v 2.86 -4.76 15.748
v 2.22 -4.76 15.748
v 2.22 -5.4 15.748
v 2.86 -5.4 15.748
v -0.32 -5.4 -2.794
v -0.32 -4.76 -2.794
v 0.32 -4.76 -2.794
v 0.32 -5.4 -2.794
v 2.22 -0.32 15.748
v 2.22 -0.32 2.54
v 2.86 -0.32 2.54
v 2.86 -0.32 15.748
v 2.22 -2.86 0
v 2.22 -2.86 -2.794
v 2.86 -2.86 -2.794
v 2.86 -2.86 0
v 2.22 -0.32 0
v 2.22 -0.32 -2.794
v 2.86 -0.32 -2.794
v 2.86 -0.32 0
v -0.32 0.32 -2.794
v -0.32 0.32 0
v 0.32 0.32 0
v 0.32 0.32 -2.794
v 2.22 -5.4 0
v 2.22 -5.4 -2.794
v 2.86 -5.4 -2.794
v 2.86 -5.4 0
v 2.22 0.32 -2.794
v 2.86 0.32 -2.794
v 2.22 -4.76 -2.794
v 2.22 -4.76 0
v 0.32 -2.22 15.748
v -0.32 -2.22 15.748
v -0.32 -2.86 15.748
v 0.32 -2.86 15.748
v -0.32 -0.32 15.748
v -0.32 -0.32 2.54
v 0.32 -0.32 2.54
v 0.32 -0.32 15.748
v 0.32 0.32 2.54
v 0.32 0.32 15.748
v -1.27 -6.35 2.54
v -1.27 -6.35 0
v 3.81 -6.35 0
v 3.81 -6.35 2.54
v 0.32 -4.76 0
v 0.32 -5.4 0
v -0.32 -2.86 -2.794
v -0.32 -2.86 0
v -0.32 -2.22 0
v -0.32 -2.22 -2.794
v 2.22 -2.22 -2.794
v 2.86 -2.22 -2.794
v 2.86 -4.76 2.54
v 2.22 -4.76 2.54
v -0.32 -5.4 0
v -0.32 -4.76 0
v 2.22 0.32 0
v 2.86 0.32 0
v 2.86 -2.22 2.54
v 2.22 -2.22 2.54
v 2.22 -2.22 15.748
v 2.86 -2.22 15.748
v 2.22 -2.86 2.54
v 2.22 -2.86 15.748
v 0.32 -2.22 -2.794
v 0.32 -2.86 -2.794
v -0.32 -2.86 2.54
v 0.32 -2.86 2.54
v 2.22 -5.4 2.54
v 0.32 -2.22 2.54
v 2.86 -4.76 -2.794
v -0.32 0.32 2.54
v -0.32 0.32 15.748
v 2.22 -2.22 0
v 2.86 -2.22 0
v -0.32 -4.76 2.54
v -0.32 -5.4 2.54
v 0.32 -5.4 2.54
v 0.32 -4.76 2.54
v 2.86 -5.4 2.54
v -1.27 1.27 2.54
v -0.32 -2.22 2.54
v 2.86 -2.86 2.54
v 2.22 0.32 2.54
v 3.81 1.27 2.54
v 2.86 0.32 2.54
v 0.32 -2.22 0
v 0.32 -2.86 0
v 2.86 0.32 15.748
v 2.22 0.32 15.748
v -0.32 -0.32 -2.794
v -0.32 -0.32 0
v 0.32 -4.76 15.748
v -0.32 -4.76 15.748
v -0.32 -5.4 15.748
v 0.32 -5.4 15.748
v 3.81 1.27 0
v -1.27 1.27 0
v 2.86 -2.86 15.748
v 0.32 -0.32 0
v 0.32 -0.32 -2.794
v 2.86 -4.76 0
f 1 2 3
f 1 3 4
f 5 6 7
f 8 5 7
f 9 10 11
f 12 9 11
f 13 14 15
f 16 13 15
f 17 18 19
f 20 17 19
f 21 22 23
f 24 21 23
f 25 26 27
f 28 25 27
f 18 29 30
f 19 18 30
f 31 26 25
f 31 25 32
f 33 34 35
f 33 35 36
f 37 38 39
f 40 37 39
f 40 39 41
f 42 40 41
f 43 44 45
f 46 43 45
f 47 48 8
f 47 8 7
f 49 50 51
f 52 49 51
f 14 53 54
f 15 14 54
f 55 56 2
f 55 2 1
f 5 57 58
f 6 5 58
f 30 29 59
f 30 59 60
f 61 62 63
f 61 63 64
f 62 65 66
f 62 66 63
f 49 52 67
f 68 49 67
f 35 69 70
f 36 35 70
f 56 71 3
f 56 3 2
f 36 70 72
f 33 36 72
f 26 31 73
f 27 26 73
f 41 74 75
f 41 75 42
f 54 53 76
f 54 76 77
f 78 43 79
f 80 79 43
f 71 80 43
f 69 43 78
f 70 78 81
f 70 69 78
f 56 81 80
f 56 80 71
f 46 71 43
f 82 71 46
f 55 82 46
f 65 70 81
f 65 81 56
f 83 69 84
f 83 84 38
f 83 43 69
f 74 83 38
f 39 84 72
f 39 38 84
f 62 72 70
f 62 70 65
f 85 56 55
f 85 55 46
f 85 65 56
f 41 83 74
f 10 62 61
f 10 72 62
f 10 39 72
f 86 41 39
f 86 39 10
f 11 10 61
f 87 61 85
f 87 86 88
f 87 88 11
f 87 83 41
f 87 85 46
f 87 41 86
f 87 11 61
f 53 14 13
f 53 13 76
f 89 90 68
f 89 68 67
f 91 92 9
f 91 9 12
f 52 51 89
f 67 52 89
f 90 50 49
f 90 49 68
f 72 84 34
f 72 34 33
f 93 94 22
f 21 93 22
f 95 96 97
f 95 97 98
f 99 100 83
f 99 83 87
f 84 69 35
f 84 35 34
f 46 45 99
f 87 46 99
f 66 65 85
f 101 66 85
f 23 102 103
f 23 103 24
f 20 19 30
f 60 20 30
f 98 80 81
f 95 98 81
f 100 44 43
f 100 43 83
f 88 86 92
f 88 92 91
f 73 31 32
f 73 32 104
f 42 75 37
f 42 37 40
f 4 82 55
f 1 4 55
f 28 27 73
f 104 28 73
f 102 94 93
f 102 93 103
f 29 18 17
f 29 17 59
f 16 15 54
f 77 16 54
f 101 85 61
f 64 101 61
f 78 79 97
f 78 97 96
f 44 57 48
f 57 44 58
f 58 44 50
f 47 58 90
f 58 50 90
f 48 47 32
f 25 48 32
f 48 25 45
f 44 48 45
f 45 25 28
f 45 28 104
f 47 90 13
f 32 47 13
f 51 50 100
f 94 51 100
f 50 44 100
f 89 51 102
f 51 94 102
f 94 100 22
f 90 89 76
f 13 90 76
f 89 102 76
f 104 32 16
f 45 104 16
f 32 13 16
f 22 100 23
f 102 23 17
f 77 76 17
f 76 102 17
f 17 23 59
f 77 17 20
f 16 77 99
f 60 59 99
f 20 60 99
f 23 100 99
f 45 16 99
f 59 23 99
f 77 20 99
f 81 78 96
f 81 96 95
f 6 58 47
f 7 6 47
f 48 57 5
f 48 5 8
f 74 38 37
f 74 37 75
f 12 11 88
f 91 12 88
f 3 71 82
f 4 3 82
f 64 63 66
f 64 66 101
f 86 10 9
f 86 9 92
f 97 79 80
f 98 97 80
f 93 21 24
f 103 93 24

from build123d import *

# Parameters (mm, degrees)
SKETCH_W                          = 5.08
SKETCH_H                          = 7.62
PAD_DEPTH                         = 2.54
SKETCH001_W                       = 0.64
SKETCH001_H                       = 0.64
PAD001_DEPTH                      = 13.208
PAD001_DEPTH_BACK                 = 5.334
SKETCH001_LINEARPATTERN_2_W       = 0.64
SKETCH001_LINEARPATTERN_2_H       = 0.64
PAD001_LINEARPATTERN_2_DEPTH      = 13.208
PAD001_LINEARPATTERN_2_DEPTH_BACK = 5.334
SKETCH001_LINEARPATTERN_3_W       = 0.64
SKETCH001_LINEARPATTERN_3_H       = 0.64
PAD001_LINEARPATTERN_3_DEPTH      = 13.208
PAD001_LINEARPATTERN_3_DEPTH_BACK = 5.334
LINEARPATTERN001_COUNT            = 2
LINEARPATTERN001_PITCH            = 2.54


with BuildPart() as part:
    # Sketch → Pad (new body)
    with BuildSketch(Plane.XY):
        with Locations((1.27, -2.54)):
            Rectangle(SKETCH_W, SKETCH_H)
    extrude(amount=PAD_DEPTH)

    # Sketch001 (on Face6 of Pad) → Pad001 (join, two sides)
    with BuildSketch(Plane.XY.offset(2.54)) as pad001_sk:
        Rectangle(SKETCH001_W, SKETCH001_H)
    pad001 = extrude(amount=PAD001_DEPTH) + extrude(pad001_sk.sketch, amount=-PAD001_DEPTH_BACK)

    # Sketch001 LinearPattern 2 → Pad001 LinearPattern 2 (add, two sides)
    with BuildSketch(Plane(origin=(0, -2.54, 2.54), x_dir=(1, 0, 0), z_dir=(0, 0, 1))) as pad001_linearpattern_2_sk:
        Rectangle(SKETCH001_LINEARPATTERN_2_W, SKETCH001_LINEARPATTERN_2_H)
    pad001_linearpattern_2 = extrude(amount=PAD001_LINEARPATTERN_2_DEPTH) + extrude(pad001_linearpattern_2_sk.sketch, amount=-PAD001_LINEARPATTERN_2_DEPTH_BACK)

    # Sketch001 LinearPattern 3 → Pad001 LinearPattern 3 (add, two sides)
    with BuildSketch(Plane(origin=(0, -5.08, 2.54), x_dir=(1, 0, 0), z_dir=(0, 0, 1))) as pad001_linearpattern_3_sk:
        Rectangle(SKETCH001_LINEARPATTERN_3_W, SKETCH001_LINEARPATTERN_3_H)
    pad001_linearpattern_3 = extrude(amount=PAD001_LINEARPATTERN_3_DEPTH) + extrude(pad001_linearpattern_3_sk.sketch, amount=-PAD001_LINEARPATTERN_3_DEPTH_BACK)

    # LinearPattern001: Pad001, Pad001 LinearPattern 2, Pad001 LinearPattern 3 ×2
    with Locations(*[(i * LINEARPATTERN001_PITCH, 0, 0) for i in range(1, LINEARPATTERN001_COUNT)]):
        add(pad001)
        add(pad001_linearpattern_2)
        add(pad001_linearpattern_3)


solid = part.part
